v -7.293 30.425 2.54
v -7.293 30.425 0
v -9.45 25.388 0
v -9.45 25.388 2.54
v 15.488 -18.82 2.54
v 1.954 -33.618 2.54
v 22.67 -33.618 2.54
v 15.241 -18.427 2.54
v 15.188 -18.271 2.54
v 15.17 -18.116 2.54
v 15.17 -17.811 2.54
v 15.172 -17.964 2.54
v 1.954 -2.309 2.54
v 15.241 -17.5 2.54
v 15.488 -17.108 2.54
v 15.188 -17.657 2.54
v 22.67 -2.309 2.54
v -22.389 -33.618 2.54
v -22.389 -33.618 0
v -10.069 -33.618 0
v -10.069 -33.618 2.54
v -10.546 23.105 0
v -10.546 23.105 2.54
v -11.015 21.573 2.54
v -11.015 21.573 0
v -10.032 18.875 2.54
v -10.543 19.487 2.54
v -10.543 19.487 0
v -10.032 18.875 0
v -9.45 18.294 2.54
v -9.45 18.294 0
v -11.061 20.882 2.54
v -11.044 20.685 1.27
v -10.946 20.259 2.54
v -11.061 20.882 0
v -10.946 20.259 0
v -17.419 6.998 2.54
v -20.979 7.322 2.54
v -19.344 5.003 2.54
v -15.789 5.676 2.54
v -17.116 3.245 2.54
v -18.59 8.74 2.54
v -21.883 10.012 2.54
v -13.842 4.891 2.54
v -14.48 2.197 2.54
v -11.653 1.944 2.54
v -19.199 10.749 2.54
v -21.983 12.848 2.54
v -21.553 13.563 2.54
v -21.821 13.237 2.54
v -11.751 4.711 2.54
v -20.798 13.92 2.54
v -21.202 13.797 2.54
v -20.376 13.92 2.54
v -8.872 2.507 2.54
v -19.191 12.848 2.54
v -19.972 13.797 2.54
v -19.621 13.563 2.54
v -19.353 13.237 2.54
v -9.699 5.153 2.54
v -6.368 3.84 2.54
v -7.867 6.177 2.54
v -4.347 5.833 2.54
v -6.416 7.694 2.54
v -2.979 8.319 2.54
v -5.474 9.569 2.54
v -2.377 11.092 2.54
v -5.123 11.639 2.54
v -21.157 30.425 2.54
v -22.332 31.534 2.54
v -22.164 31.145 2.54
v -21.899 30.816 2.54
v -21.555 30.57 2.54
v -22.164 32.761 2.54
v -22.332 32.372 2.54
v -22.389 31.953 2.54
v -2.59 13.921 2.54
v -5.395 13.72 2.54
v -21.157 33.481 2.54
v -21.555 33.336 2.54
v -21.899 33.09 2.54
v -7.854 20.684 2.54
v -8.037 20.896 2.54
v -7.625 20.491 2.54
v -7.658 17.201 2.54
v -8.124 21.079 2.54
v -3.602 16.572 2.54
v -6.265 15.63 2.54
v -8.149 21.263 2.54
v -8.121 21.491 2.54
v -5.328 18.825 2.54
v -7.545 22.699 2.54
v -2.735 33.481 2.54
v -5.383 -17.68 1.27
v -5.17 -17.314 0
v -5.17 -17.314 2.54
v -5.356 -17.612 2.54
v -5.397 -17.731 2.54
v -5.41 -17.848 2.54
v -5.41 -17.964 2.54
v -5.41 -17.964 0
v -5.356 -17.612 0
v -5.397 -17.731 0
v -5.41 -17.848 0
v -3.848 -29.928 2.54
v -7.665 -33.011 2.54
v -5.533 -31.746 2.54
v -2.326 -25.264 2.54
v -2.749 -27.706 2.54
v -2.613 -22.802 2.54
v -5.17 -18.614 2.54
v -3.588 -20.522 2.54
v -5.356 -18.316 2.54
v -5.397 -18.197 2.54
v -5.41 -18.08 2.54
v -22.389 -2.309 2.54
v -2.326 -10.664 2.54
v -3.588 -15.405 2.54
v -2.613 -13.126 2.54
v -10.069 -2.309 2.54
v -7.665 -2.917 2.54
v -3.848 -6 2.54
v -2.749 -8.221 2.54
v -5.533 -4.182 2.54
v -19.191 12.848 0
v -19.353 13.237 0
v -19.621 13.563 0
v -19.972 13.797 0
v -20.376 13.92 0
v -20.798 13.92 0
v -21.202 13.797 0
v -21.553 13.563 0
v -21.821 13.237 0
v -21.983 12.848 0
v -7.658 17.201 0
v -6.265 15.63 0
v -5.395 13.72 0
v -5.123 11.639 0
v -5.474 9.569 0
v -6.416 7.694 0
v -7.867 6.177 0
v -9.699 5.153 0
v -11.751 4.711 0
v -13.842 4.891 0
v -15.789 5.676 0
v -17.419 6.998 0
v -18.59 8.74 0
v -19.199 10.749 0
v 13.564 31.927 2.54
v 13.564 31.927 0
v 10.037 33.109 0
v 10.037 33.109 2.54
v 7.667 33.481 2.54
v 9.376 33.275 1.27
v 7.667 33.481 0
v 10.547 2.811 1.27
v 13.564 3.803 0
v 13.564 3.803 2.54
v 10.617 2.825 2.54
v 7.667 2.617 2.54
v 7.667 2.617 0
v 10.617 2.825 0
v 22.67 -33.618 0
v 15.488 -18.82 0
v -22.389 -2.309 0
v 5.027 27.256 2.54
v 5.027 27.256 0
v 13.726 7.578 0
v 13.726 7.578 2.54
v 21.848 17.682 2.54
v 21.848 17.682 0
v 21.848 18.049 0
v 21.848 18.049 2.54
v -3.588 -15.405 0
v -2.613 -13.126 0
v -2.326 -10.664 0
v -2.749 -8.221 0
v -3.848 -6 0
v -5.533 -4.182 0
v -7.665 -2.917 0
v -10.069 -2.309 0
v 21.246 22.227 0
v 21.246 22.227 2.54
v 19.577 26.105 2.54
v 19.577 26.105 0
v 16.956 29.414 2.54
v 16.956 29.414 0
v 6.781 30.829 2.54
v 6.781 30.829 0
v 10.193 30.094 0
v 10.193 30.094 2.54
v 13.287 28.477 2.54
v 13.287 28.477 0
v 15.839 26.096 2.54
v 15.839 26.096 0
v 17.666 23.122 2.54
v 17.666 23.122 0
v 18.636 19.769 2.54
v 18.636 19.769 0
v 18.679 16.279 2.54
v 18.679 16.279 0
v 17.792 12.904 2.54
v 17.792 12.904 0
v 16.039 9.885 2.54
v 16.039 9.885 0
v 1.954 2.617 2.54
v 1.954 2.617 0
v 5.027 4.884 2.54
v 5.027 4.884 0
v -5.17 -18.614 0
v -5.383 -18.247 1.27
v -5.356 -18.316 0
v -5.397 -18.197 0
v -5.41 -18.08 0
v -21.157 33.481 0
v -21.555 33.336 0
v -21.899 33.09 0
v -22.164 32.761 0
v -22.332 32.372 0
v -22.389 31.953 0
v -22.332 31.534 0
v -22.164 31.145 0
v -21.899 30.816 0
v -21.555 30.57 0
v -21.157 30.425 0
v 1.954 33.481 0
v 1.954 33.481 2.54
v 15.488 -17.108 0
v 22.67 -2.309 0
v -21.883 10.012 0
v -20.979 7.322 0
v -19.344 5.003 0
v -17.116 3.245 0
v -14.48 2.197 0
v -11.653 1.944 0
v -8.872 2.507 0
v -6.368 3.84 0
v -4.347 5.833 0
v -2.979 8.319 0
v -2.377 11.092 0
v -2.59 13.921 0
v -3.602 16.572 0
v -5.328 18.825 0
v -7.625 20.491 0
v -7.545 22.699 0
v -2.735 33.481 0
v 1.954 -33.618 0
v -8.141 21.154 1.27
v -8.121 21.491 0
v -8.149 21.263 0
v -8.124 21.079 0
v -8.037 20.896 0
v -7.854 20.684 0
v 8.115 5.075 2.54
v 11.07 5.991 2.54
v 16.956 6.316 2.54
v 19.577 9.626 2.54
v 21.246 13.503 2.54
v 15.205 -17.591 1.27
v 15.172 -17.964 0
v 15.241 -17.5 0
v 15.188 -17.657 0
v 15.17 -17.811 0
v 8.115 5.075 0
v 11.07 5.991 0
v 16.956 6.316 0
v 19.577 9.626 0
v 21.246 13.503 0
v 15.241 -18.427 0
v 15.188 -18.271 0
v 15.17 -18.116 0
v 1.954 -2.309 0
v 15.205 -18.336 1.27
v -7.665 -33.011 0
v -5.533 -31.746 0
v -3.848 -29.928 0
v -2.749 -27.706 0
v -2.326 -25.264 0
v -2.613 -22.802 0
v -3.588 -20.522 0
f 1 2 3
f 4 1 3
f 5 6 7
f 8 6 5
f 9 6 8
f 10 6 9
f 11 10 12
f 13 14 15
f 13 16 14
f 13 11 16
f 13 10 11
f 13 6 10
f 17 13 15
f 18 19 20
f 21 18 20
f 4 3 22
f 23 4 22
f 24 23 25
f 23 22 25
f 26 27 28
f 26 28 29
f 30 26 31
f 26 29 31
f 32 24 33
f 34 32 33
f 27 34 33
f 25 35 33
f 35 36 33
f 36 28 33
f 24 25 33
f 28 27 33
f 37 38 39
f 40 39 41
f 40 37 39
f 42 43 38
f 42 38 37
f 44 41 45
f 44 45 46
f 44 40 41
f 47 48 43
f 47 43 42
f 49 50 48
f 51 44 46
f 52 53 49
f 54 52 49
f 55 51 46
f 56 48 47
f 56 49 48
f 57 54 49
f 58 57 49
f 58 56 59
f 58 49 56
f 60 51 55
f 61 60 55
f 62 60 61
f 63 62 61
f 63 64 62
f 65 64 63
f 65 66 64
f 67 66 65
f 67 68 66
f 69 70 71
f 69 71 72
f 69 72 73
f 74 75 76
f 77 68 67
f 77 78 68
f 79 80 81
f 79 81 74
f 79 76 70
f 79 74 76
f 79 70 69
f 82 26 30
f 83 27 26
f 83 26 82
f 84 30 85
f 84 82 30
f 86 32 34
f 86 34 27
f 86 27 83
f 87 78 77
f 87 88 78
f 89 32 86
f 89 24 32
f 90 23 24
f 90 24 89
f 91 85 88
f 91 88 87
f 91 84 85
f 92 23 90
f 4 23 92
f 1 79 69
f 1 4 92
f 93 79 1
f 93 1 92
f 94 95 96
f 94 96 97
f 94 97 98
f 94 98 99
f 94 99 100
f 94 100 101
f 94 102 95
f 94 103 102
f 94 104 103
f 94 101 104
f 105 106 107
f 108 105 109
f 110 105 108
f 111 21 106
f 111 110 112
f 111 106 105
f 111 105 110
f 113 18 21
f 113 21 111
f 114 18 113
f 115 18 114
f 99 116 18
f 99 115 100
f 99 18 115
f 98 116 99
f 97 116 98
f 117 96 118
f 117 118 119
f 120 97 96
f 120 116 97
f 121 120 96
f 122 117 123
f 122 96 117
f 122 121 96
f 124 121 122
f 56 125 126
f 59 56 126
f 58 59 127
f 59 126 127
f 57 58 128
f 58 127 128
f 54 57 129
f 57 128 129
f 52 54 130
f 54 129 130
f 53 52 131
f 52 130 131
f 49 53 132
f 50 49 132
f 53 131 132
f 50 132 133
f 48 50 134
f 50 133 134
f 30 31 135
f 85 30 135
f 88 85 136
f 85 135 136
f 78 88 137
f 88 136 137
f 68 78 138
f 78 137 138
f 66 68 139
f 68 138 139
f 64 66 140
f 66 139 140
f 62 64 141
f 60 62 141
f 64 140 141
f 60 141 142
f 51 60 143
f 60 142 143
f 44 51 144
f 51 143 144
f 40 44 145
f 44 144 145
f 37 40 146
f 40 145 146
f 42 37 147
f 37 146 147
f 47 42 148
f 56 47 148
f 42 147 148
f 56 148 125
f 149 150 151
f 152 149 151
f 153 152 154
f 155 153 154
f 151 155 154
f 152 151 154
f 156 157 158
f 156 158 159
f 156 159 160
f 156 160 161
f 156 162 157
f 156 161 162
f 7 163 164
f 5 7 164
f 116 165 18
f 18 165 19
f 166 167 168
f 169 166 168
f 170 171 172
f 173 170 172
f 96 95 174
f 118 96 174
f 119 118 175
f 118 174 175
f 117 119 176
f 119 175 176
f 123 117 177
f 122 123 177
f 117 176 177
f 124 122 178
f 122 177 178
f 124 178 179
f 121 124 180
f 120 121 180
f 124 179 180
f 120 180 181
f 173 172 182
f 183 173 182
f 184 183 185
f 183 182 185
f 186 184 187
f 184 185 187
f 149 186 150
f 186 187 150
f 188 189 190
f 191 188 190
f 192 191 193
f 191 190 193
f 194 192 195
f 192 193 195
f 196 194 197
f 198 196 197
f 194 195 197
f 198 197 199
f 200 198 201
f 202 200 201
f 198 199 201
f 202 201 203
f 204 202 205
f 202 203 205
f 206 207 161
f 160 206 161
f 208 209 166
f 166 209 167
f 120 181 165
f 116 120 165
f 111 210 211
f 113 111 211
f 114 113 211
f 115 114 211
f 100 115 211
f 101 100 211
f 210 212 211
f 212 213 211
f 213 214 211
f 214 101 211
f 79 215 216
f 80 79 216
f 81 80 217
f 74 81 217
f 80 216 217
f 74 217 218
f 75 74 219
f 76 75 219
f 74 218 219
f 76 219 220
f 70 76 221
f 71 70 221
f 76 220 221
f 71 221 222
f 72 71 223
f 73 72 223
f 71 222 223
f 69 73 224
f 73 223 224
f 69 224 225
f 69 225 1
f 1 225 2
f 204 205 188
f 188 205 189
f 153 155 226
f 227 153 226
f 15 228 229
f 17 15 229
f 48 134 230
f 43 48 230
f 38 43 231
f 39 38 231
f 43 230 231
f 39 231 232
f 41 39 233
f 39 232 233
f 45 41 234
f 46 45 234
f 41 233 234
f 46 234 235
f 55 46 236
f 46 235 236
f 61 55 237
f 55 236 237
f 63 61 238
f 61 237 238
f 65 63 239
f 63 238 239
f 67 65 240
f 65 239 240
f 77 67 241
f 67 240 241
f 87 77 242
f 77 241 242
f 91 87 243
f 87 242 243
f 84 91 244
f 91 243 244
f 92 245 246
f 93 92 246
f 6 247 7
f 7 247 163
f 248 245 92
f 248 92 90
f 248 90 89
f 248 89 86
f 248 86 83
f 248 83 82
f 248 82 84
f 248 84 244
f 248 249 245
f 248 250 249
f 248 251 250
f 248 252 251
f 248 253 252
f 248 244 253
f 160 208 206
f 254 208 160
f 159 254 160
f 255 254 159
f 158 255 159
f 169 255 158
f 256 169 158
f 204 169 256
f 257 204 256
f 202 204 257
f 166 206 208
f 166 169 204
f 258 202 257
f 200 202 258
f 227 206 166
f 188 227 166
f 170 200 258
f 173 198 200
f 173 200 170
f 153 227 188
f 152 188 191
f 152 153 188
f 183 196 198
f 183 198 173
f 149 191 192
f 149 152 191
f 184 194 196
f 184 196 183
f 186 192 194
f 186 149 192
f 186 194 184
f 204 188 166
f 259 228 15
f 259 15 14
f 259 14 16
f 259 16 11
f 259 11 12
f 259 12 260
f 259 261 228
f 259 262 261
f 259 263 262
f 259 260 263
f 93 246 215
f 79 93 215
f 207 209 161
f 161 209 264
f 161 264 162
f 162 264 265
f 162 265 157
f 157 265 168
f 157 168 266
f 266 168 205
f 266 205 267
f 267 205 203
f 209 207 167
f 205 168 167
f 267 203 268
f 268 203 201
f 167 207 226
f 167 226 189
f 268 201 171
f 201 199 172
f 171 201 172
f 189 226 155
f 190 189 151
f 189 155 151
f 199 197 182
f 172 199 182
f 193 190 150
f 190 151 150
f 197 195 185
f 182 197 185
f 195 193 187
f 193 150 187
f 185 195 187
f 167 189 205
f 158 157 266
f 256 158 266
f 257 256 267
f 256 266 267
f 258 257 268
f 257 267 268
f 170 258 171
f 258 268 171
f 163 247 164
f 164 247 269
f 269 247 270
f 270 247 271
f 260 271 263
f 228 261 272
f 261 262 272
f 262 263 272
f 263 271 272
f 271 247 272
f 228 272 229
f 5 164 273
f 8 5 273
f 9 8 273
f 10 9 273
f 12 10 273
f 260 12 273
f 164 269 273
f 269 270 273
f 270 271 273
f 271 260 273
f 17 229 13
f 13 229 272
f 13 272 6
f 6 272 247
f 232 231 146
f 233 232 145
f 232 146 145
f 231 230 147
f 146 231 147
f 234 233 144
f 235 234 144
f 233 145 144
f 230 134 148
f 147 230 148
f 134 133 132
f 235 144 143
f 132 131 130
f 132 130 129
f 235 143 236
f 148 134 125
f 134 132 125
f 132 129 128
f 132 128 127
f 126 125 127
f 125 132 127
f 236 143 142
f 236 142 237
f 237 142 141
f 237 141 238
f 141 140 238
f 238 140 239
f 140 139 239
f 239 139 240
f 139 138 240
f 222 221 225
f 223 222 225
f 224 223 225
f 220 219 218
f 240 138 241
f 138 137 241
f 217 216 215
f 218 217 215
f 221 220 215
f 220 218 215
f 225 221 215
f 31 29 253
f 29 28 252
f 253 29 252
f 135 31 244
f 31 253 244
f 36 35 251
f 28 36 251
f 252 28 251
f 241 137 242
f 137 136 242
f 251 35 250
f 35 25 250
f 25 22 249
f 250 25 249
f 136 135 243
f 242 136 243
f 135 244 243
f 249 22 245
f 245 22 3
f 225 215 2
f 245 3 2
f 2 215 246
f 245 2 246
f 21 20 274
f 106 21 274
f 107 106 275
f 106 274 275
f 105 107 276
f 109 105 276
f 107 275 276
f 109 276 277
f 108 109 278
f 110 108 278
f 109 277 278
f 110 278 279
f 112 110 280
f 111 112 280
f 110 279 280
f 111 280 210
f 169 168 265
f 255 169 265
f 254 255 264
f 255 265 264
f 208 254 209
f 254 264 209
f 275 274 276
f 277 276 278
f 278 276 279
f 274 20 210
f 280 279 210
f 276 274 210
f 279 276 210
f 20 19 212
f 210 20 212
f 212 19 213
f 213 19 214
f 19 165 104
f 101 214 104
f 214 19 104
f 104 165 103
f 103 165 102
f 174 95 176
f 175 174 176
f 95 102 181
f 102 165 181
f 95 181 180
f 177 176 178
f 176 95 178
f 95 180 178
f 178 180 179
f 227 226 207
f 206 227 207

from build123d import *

# Parameters (mm, degrees)
F1_DEPTH = 2.54


with BuildPart() as f1:
    # F0 (on Top) → F1 (new body)
    with BuildSketch(Plane.XY):
        with BuildLine():
            Line((-7.5453622267, 22.6989928633), (-2.7351737954, 33.4806852043))
            Line((-2.7351737954, 33.4806852043), (-21.1572051048, 33.4806852043))
            ThreePointArc((-21.1572051048, 33.4806852043), (-22.3890896886, 31.9530339911), (-21.1572051048, 30.425382778))
            Line((-21.1572051048, 30.425382778), (-7.2931135073, 30.425382778))
            Line((-7.2931135073, 30.425382778), (-9.4495294616, 25.3879800439))
            add(Edge.make_bspline(
                [(-9.4495294616, 25.3879800439), (-10.3302159731, 23.6726618568), (-11.8808970013, 20.6523914937), (-10.1830913379, 19.0052173822), (-9.4495294616, 18.2935316116)],
                knots=[0, 0, 0, 0, 0.5679353107, 1, 1, 1, 1], degree=3))
            ThreePointArc((-9.4495294616, 18.2935316116), (-8.744805336, 5.5966861339), (-19.1914085299, 12.8475483507))
            ThreePointArc((-19.1914085299, 12.8475483507), (-20.5873309935, 13.9352987723), (-21.9832534571, 12.8475483507))
            ThreePointArc((-21.9832534571, 12.8475483507), (-7.5716745464, 3.0830422585), (-7.6246123494, 20.4909825018))
            add(Edge.make_bspline(
                [(-7.5453622267, 22.6989928633), (-7.8757345138, 22.1285959519), (-8.4306078493, 21.1705917574), (-7.8693930702, 20.681447967), (-7.6246123494, 20.4909825018)],
                knots=[0, 0, 0, 0, 0.5706142153, 0.9583691649, 0.9583691649, 0.9583691649, 0.9583691649], degree=3))
        make_face()
    extrude(amount=F1_DEPTH)


with BuildPart() as f1b:
    # F0 (on Top) → F1, piece 2 (new body)
    with BuildSketch(Plane.XY):
        with BuildLine():
            Line((7.6673883013, 33.4806852043), (1.9535701722, 33.4806852043))
            Line((1.9535701722, 33.4806852043), (1.9535701722, 2.6171170175))
            Line((1.9535701722, 2.6171170175), (7.6673883013, 2.6171170175))
            add(Edge.make_bspline(
                [(13.5640528841, 3.8033656441), (12.5585792201, 3.4051600509), (10.5947152477, 2.6273956539), (8.6274422547, 2.6204880265), (7.6673883013, 2.6171170175)],
                knots=[0, 0, 0, 0, 0.5119874279, 1, 1, 1, 1], degree=3))
            ThreePointArc((13.5640528841, 3.8033656441), (19.5771167094, 9.6257290209), (21.8482203782, 17.6817168551))
            Line((21.8482203782, 17.6817168551), (21.8482203782, 18.0489011109))
            ThreePointArc((21.8482203782, 18.0489011109), (19.5771167094, 26.1048889451), (13.5640528841, 31.9272523219))
            add(Edge.make_bspline(
                [(13.5640528841, 31.9272523219), (12.0188625137, 32.4806988664), (9.5071250594, 33.3803371514), (8.1786150797, 33.4528004476), (7.6673883013, 33.4806852043)],
                knots=[0, 0, 0, 0, 0.6151878524, 1, 1, 1, 1], degree=3))
        make_face()
        with BuildLine():
            ThreePointArc((13.7255926495, 7.5781230036), (9.6198125415, 5.4448354943), (5.0269701927, 4.8843490524))
            Line((5.0269701927, 4.8843490524), (5.0269701927, 27.2558980547))
            Line((5.0269701927, 27.2558980547), (13.7255926495, 7.5781230036))
        make_face(mode=Mode.SUBTRACT)
        with BuildLine():
            ThreePointArc((6.7811124511, 30.8286115181), (17.6657420253, 23.1223286699), (16.0391214303, 9.8854082672))
            Line((16.0391214303, 9.8854082672), (6.7811124511, 30.8286115181))
        make_face(mode=Mode.SUBTRACT)
    extrude(amount=F1_DEPTH)


with BuildPart() as f1c:
    # F0 (on Top) → F1, piece 3 (new body)
    with BuildSketch(Plane.XY):
        with BuildLine():
            Line((1.9535701722, -33.6182080209), (21.8482203782, -33.6182080209))
            Line((21.8482203782, -33.6182080209), (22.670282051, -33.6182080209))
            Line((22.670282051, -33.6182080209), (15.4876355082, -18.8196848612))
            add(Edge.make_bspline(
                [(15.4876355082, -18.8196848612), (15.371168109, -18.6560732739), (15.159509665, -18.3587387901), (15.1679139181, -18.0863425739), (15.171693638, -17.9638353875)],
                knots=[0, 0, 0, 0, 0.550261057, 1, 1, 1, 1], degree=3))
            add(Edge.make_bspline(
                [(15.4876355082, -17.1079859138), (15.371168109, -17.2715975011), (15.159509665, -17.5689319849), (15.1679139181, -17.8413282011), (15.171693638, -17.9638353875)],
                knots=[0, 0, 0, 0, 0.550261057, 1, 1, 1, 1], degree=3))
            Line((15.4876355082, -17.1079859138), (22.670282051, -2.3094627541))
            Line((22.670282051, -2.3094627541), (1.9535701722, -2.3094627541))
            Line((1.9535701722, -2.3094627541), (1.9535701722, -33.6182080209))
        make_face()
    extrude(amount=F1_DEPTH)


with BuildPart() as f1d:
    # F0 (on Top) → F1, piece 4 (new body)
    with BuildSketch(Plane.XY):
        with BuildLine():
            Line((-22.3890896886, -2.3094627541), (-22.3890896886, -33.6182080209))
            Line((-22.3890896886, -33.6182080209), (-10.0687015802, -33.6182080209))
            ThreePointArc((-10.0687015802, -33.6182080209), (-2.7489802993, -27.706179837), (-5.1699676551, -18.6139184516))
            add(Edge.make_bspline(
                [(-5.1699676551, -18.6139184516), (-5.2577137292, -18.4897791328), (-5.4173213156, -18.2639732804), (-5.4122223799, -18.0570156997), (-5.4099266417, -17.9638353875)],
                knots=[0, 0, 0, 0, 0.5497612996, 1, 1, 1, 1], degree=3))
            add(Edge.make_bspline(
                [(-5.1699676551, -17.3137523234), (-5.2577137292, -17.4378916422), (-5.4173213156, -17.6636974946), (-5.4122223799, -17.8706550753), (-5.4099266417, -17.9638353875)],
                knots=[0, 0, 0, 0, 0.5497612996, 1, 1, 1, 1], degree=3))
            ThreePointArc((-5.1699676551, -17.3137523234), (-2.7489802993, -8.221490938), (-10.0687015802, -2.3094627541))
            Line((-10.0687015802, -2.3094627541), (-22.3890896886, -2.3094627541))
        make_face()
    extrude(amount=F1_DEPTH)


solid = Compound([f1.part, f1b.part, f1c.part, f1d.part])
